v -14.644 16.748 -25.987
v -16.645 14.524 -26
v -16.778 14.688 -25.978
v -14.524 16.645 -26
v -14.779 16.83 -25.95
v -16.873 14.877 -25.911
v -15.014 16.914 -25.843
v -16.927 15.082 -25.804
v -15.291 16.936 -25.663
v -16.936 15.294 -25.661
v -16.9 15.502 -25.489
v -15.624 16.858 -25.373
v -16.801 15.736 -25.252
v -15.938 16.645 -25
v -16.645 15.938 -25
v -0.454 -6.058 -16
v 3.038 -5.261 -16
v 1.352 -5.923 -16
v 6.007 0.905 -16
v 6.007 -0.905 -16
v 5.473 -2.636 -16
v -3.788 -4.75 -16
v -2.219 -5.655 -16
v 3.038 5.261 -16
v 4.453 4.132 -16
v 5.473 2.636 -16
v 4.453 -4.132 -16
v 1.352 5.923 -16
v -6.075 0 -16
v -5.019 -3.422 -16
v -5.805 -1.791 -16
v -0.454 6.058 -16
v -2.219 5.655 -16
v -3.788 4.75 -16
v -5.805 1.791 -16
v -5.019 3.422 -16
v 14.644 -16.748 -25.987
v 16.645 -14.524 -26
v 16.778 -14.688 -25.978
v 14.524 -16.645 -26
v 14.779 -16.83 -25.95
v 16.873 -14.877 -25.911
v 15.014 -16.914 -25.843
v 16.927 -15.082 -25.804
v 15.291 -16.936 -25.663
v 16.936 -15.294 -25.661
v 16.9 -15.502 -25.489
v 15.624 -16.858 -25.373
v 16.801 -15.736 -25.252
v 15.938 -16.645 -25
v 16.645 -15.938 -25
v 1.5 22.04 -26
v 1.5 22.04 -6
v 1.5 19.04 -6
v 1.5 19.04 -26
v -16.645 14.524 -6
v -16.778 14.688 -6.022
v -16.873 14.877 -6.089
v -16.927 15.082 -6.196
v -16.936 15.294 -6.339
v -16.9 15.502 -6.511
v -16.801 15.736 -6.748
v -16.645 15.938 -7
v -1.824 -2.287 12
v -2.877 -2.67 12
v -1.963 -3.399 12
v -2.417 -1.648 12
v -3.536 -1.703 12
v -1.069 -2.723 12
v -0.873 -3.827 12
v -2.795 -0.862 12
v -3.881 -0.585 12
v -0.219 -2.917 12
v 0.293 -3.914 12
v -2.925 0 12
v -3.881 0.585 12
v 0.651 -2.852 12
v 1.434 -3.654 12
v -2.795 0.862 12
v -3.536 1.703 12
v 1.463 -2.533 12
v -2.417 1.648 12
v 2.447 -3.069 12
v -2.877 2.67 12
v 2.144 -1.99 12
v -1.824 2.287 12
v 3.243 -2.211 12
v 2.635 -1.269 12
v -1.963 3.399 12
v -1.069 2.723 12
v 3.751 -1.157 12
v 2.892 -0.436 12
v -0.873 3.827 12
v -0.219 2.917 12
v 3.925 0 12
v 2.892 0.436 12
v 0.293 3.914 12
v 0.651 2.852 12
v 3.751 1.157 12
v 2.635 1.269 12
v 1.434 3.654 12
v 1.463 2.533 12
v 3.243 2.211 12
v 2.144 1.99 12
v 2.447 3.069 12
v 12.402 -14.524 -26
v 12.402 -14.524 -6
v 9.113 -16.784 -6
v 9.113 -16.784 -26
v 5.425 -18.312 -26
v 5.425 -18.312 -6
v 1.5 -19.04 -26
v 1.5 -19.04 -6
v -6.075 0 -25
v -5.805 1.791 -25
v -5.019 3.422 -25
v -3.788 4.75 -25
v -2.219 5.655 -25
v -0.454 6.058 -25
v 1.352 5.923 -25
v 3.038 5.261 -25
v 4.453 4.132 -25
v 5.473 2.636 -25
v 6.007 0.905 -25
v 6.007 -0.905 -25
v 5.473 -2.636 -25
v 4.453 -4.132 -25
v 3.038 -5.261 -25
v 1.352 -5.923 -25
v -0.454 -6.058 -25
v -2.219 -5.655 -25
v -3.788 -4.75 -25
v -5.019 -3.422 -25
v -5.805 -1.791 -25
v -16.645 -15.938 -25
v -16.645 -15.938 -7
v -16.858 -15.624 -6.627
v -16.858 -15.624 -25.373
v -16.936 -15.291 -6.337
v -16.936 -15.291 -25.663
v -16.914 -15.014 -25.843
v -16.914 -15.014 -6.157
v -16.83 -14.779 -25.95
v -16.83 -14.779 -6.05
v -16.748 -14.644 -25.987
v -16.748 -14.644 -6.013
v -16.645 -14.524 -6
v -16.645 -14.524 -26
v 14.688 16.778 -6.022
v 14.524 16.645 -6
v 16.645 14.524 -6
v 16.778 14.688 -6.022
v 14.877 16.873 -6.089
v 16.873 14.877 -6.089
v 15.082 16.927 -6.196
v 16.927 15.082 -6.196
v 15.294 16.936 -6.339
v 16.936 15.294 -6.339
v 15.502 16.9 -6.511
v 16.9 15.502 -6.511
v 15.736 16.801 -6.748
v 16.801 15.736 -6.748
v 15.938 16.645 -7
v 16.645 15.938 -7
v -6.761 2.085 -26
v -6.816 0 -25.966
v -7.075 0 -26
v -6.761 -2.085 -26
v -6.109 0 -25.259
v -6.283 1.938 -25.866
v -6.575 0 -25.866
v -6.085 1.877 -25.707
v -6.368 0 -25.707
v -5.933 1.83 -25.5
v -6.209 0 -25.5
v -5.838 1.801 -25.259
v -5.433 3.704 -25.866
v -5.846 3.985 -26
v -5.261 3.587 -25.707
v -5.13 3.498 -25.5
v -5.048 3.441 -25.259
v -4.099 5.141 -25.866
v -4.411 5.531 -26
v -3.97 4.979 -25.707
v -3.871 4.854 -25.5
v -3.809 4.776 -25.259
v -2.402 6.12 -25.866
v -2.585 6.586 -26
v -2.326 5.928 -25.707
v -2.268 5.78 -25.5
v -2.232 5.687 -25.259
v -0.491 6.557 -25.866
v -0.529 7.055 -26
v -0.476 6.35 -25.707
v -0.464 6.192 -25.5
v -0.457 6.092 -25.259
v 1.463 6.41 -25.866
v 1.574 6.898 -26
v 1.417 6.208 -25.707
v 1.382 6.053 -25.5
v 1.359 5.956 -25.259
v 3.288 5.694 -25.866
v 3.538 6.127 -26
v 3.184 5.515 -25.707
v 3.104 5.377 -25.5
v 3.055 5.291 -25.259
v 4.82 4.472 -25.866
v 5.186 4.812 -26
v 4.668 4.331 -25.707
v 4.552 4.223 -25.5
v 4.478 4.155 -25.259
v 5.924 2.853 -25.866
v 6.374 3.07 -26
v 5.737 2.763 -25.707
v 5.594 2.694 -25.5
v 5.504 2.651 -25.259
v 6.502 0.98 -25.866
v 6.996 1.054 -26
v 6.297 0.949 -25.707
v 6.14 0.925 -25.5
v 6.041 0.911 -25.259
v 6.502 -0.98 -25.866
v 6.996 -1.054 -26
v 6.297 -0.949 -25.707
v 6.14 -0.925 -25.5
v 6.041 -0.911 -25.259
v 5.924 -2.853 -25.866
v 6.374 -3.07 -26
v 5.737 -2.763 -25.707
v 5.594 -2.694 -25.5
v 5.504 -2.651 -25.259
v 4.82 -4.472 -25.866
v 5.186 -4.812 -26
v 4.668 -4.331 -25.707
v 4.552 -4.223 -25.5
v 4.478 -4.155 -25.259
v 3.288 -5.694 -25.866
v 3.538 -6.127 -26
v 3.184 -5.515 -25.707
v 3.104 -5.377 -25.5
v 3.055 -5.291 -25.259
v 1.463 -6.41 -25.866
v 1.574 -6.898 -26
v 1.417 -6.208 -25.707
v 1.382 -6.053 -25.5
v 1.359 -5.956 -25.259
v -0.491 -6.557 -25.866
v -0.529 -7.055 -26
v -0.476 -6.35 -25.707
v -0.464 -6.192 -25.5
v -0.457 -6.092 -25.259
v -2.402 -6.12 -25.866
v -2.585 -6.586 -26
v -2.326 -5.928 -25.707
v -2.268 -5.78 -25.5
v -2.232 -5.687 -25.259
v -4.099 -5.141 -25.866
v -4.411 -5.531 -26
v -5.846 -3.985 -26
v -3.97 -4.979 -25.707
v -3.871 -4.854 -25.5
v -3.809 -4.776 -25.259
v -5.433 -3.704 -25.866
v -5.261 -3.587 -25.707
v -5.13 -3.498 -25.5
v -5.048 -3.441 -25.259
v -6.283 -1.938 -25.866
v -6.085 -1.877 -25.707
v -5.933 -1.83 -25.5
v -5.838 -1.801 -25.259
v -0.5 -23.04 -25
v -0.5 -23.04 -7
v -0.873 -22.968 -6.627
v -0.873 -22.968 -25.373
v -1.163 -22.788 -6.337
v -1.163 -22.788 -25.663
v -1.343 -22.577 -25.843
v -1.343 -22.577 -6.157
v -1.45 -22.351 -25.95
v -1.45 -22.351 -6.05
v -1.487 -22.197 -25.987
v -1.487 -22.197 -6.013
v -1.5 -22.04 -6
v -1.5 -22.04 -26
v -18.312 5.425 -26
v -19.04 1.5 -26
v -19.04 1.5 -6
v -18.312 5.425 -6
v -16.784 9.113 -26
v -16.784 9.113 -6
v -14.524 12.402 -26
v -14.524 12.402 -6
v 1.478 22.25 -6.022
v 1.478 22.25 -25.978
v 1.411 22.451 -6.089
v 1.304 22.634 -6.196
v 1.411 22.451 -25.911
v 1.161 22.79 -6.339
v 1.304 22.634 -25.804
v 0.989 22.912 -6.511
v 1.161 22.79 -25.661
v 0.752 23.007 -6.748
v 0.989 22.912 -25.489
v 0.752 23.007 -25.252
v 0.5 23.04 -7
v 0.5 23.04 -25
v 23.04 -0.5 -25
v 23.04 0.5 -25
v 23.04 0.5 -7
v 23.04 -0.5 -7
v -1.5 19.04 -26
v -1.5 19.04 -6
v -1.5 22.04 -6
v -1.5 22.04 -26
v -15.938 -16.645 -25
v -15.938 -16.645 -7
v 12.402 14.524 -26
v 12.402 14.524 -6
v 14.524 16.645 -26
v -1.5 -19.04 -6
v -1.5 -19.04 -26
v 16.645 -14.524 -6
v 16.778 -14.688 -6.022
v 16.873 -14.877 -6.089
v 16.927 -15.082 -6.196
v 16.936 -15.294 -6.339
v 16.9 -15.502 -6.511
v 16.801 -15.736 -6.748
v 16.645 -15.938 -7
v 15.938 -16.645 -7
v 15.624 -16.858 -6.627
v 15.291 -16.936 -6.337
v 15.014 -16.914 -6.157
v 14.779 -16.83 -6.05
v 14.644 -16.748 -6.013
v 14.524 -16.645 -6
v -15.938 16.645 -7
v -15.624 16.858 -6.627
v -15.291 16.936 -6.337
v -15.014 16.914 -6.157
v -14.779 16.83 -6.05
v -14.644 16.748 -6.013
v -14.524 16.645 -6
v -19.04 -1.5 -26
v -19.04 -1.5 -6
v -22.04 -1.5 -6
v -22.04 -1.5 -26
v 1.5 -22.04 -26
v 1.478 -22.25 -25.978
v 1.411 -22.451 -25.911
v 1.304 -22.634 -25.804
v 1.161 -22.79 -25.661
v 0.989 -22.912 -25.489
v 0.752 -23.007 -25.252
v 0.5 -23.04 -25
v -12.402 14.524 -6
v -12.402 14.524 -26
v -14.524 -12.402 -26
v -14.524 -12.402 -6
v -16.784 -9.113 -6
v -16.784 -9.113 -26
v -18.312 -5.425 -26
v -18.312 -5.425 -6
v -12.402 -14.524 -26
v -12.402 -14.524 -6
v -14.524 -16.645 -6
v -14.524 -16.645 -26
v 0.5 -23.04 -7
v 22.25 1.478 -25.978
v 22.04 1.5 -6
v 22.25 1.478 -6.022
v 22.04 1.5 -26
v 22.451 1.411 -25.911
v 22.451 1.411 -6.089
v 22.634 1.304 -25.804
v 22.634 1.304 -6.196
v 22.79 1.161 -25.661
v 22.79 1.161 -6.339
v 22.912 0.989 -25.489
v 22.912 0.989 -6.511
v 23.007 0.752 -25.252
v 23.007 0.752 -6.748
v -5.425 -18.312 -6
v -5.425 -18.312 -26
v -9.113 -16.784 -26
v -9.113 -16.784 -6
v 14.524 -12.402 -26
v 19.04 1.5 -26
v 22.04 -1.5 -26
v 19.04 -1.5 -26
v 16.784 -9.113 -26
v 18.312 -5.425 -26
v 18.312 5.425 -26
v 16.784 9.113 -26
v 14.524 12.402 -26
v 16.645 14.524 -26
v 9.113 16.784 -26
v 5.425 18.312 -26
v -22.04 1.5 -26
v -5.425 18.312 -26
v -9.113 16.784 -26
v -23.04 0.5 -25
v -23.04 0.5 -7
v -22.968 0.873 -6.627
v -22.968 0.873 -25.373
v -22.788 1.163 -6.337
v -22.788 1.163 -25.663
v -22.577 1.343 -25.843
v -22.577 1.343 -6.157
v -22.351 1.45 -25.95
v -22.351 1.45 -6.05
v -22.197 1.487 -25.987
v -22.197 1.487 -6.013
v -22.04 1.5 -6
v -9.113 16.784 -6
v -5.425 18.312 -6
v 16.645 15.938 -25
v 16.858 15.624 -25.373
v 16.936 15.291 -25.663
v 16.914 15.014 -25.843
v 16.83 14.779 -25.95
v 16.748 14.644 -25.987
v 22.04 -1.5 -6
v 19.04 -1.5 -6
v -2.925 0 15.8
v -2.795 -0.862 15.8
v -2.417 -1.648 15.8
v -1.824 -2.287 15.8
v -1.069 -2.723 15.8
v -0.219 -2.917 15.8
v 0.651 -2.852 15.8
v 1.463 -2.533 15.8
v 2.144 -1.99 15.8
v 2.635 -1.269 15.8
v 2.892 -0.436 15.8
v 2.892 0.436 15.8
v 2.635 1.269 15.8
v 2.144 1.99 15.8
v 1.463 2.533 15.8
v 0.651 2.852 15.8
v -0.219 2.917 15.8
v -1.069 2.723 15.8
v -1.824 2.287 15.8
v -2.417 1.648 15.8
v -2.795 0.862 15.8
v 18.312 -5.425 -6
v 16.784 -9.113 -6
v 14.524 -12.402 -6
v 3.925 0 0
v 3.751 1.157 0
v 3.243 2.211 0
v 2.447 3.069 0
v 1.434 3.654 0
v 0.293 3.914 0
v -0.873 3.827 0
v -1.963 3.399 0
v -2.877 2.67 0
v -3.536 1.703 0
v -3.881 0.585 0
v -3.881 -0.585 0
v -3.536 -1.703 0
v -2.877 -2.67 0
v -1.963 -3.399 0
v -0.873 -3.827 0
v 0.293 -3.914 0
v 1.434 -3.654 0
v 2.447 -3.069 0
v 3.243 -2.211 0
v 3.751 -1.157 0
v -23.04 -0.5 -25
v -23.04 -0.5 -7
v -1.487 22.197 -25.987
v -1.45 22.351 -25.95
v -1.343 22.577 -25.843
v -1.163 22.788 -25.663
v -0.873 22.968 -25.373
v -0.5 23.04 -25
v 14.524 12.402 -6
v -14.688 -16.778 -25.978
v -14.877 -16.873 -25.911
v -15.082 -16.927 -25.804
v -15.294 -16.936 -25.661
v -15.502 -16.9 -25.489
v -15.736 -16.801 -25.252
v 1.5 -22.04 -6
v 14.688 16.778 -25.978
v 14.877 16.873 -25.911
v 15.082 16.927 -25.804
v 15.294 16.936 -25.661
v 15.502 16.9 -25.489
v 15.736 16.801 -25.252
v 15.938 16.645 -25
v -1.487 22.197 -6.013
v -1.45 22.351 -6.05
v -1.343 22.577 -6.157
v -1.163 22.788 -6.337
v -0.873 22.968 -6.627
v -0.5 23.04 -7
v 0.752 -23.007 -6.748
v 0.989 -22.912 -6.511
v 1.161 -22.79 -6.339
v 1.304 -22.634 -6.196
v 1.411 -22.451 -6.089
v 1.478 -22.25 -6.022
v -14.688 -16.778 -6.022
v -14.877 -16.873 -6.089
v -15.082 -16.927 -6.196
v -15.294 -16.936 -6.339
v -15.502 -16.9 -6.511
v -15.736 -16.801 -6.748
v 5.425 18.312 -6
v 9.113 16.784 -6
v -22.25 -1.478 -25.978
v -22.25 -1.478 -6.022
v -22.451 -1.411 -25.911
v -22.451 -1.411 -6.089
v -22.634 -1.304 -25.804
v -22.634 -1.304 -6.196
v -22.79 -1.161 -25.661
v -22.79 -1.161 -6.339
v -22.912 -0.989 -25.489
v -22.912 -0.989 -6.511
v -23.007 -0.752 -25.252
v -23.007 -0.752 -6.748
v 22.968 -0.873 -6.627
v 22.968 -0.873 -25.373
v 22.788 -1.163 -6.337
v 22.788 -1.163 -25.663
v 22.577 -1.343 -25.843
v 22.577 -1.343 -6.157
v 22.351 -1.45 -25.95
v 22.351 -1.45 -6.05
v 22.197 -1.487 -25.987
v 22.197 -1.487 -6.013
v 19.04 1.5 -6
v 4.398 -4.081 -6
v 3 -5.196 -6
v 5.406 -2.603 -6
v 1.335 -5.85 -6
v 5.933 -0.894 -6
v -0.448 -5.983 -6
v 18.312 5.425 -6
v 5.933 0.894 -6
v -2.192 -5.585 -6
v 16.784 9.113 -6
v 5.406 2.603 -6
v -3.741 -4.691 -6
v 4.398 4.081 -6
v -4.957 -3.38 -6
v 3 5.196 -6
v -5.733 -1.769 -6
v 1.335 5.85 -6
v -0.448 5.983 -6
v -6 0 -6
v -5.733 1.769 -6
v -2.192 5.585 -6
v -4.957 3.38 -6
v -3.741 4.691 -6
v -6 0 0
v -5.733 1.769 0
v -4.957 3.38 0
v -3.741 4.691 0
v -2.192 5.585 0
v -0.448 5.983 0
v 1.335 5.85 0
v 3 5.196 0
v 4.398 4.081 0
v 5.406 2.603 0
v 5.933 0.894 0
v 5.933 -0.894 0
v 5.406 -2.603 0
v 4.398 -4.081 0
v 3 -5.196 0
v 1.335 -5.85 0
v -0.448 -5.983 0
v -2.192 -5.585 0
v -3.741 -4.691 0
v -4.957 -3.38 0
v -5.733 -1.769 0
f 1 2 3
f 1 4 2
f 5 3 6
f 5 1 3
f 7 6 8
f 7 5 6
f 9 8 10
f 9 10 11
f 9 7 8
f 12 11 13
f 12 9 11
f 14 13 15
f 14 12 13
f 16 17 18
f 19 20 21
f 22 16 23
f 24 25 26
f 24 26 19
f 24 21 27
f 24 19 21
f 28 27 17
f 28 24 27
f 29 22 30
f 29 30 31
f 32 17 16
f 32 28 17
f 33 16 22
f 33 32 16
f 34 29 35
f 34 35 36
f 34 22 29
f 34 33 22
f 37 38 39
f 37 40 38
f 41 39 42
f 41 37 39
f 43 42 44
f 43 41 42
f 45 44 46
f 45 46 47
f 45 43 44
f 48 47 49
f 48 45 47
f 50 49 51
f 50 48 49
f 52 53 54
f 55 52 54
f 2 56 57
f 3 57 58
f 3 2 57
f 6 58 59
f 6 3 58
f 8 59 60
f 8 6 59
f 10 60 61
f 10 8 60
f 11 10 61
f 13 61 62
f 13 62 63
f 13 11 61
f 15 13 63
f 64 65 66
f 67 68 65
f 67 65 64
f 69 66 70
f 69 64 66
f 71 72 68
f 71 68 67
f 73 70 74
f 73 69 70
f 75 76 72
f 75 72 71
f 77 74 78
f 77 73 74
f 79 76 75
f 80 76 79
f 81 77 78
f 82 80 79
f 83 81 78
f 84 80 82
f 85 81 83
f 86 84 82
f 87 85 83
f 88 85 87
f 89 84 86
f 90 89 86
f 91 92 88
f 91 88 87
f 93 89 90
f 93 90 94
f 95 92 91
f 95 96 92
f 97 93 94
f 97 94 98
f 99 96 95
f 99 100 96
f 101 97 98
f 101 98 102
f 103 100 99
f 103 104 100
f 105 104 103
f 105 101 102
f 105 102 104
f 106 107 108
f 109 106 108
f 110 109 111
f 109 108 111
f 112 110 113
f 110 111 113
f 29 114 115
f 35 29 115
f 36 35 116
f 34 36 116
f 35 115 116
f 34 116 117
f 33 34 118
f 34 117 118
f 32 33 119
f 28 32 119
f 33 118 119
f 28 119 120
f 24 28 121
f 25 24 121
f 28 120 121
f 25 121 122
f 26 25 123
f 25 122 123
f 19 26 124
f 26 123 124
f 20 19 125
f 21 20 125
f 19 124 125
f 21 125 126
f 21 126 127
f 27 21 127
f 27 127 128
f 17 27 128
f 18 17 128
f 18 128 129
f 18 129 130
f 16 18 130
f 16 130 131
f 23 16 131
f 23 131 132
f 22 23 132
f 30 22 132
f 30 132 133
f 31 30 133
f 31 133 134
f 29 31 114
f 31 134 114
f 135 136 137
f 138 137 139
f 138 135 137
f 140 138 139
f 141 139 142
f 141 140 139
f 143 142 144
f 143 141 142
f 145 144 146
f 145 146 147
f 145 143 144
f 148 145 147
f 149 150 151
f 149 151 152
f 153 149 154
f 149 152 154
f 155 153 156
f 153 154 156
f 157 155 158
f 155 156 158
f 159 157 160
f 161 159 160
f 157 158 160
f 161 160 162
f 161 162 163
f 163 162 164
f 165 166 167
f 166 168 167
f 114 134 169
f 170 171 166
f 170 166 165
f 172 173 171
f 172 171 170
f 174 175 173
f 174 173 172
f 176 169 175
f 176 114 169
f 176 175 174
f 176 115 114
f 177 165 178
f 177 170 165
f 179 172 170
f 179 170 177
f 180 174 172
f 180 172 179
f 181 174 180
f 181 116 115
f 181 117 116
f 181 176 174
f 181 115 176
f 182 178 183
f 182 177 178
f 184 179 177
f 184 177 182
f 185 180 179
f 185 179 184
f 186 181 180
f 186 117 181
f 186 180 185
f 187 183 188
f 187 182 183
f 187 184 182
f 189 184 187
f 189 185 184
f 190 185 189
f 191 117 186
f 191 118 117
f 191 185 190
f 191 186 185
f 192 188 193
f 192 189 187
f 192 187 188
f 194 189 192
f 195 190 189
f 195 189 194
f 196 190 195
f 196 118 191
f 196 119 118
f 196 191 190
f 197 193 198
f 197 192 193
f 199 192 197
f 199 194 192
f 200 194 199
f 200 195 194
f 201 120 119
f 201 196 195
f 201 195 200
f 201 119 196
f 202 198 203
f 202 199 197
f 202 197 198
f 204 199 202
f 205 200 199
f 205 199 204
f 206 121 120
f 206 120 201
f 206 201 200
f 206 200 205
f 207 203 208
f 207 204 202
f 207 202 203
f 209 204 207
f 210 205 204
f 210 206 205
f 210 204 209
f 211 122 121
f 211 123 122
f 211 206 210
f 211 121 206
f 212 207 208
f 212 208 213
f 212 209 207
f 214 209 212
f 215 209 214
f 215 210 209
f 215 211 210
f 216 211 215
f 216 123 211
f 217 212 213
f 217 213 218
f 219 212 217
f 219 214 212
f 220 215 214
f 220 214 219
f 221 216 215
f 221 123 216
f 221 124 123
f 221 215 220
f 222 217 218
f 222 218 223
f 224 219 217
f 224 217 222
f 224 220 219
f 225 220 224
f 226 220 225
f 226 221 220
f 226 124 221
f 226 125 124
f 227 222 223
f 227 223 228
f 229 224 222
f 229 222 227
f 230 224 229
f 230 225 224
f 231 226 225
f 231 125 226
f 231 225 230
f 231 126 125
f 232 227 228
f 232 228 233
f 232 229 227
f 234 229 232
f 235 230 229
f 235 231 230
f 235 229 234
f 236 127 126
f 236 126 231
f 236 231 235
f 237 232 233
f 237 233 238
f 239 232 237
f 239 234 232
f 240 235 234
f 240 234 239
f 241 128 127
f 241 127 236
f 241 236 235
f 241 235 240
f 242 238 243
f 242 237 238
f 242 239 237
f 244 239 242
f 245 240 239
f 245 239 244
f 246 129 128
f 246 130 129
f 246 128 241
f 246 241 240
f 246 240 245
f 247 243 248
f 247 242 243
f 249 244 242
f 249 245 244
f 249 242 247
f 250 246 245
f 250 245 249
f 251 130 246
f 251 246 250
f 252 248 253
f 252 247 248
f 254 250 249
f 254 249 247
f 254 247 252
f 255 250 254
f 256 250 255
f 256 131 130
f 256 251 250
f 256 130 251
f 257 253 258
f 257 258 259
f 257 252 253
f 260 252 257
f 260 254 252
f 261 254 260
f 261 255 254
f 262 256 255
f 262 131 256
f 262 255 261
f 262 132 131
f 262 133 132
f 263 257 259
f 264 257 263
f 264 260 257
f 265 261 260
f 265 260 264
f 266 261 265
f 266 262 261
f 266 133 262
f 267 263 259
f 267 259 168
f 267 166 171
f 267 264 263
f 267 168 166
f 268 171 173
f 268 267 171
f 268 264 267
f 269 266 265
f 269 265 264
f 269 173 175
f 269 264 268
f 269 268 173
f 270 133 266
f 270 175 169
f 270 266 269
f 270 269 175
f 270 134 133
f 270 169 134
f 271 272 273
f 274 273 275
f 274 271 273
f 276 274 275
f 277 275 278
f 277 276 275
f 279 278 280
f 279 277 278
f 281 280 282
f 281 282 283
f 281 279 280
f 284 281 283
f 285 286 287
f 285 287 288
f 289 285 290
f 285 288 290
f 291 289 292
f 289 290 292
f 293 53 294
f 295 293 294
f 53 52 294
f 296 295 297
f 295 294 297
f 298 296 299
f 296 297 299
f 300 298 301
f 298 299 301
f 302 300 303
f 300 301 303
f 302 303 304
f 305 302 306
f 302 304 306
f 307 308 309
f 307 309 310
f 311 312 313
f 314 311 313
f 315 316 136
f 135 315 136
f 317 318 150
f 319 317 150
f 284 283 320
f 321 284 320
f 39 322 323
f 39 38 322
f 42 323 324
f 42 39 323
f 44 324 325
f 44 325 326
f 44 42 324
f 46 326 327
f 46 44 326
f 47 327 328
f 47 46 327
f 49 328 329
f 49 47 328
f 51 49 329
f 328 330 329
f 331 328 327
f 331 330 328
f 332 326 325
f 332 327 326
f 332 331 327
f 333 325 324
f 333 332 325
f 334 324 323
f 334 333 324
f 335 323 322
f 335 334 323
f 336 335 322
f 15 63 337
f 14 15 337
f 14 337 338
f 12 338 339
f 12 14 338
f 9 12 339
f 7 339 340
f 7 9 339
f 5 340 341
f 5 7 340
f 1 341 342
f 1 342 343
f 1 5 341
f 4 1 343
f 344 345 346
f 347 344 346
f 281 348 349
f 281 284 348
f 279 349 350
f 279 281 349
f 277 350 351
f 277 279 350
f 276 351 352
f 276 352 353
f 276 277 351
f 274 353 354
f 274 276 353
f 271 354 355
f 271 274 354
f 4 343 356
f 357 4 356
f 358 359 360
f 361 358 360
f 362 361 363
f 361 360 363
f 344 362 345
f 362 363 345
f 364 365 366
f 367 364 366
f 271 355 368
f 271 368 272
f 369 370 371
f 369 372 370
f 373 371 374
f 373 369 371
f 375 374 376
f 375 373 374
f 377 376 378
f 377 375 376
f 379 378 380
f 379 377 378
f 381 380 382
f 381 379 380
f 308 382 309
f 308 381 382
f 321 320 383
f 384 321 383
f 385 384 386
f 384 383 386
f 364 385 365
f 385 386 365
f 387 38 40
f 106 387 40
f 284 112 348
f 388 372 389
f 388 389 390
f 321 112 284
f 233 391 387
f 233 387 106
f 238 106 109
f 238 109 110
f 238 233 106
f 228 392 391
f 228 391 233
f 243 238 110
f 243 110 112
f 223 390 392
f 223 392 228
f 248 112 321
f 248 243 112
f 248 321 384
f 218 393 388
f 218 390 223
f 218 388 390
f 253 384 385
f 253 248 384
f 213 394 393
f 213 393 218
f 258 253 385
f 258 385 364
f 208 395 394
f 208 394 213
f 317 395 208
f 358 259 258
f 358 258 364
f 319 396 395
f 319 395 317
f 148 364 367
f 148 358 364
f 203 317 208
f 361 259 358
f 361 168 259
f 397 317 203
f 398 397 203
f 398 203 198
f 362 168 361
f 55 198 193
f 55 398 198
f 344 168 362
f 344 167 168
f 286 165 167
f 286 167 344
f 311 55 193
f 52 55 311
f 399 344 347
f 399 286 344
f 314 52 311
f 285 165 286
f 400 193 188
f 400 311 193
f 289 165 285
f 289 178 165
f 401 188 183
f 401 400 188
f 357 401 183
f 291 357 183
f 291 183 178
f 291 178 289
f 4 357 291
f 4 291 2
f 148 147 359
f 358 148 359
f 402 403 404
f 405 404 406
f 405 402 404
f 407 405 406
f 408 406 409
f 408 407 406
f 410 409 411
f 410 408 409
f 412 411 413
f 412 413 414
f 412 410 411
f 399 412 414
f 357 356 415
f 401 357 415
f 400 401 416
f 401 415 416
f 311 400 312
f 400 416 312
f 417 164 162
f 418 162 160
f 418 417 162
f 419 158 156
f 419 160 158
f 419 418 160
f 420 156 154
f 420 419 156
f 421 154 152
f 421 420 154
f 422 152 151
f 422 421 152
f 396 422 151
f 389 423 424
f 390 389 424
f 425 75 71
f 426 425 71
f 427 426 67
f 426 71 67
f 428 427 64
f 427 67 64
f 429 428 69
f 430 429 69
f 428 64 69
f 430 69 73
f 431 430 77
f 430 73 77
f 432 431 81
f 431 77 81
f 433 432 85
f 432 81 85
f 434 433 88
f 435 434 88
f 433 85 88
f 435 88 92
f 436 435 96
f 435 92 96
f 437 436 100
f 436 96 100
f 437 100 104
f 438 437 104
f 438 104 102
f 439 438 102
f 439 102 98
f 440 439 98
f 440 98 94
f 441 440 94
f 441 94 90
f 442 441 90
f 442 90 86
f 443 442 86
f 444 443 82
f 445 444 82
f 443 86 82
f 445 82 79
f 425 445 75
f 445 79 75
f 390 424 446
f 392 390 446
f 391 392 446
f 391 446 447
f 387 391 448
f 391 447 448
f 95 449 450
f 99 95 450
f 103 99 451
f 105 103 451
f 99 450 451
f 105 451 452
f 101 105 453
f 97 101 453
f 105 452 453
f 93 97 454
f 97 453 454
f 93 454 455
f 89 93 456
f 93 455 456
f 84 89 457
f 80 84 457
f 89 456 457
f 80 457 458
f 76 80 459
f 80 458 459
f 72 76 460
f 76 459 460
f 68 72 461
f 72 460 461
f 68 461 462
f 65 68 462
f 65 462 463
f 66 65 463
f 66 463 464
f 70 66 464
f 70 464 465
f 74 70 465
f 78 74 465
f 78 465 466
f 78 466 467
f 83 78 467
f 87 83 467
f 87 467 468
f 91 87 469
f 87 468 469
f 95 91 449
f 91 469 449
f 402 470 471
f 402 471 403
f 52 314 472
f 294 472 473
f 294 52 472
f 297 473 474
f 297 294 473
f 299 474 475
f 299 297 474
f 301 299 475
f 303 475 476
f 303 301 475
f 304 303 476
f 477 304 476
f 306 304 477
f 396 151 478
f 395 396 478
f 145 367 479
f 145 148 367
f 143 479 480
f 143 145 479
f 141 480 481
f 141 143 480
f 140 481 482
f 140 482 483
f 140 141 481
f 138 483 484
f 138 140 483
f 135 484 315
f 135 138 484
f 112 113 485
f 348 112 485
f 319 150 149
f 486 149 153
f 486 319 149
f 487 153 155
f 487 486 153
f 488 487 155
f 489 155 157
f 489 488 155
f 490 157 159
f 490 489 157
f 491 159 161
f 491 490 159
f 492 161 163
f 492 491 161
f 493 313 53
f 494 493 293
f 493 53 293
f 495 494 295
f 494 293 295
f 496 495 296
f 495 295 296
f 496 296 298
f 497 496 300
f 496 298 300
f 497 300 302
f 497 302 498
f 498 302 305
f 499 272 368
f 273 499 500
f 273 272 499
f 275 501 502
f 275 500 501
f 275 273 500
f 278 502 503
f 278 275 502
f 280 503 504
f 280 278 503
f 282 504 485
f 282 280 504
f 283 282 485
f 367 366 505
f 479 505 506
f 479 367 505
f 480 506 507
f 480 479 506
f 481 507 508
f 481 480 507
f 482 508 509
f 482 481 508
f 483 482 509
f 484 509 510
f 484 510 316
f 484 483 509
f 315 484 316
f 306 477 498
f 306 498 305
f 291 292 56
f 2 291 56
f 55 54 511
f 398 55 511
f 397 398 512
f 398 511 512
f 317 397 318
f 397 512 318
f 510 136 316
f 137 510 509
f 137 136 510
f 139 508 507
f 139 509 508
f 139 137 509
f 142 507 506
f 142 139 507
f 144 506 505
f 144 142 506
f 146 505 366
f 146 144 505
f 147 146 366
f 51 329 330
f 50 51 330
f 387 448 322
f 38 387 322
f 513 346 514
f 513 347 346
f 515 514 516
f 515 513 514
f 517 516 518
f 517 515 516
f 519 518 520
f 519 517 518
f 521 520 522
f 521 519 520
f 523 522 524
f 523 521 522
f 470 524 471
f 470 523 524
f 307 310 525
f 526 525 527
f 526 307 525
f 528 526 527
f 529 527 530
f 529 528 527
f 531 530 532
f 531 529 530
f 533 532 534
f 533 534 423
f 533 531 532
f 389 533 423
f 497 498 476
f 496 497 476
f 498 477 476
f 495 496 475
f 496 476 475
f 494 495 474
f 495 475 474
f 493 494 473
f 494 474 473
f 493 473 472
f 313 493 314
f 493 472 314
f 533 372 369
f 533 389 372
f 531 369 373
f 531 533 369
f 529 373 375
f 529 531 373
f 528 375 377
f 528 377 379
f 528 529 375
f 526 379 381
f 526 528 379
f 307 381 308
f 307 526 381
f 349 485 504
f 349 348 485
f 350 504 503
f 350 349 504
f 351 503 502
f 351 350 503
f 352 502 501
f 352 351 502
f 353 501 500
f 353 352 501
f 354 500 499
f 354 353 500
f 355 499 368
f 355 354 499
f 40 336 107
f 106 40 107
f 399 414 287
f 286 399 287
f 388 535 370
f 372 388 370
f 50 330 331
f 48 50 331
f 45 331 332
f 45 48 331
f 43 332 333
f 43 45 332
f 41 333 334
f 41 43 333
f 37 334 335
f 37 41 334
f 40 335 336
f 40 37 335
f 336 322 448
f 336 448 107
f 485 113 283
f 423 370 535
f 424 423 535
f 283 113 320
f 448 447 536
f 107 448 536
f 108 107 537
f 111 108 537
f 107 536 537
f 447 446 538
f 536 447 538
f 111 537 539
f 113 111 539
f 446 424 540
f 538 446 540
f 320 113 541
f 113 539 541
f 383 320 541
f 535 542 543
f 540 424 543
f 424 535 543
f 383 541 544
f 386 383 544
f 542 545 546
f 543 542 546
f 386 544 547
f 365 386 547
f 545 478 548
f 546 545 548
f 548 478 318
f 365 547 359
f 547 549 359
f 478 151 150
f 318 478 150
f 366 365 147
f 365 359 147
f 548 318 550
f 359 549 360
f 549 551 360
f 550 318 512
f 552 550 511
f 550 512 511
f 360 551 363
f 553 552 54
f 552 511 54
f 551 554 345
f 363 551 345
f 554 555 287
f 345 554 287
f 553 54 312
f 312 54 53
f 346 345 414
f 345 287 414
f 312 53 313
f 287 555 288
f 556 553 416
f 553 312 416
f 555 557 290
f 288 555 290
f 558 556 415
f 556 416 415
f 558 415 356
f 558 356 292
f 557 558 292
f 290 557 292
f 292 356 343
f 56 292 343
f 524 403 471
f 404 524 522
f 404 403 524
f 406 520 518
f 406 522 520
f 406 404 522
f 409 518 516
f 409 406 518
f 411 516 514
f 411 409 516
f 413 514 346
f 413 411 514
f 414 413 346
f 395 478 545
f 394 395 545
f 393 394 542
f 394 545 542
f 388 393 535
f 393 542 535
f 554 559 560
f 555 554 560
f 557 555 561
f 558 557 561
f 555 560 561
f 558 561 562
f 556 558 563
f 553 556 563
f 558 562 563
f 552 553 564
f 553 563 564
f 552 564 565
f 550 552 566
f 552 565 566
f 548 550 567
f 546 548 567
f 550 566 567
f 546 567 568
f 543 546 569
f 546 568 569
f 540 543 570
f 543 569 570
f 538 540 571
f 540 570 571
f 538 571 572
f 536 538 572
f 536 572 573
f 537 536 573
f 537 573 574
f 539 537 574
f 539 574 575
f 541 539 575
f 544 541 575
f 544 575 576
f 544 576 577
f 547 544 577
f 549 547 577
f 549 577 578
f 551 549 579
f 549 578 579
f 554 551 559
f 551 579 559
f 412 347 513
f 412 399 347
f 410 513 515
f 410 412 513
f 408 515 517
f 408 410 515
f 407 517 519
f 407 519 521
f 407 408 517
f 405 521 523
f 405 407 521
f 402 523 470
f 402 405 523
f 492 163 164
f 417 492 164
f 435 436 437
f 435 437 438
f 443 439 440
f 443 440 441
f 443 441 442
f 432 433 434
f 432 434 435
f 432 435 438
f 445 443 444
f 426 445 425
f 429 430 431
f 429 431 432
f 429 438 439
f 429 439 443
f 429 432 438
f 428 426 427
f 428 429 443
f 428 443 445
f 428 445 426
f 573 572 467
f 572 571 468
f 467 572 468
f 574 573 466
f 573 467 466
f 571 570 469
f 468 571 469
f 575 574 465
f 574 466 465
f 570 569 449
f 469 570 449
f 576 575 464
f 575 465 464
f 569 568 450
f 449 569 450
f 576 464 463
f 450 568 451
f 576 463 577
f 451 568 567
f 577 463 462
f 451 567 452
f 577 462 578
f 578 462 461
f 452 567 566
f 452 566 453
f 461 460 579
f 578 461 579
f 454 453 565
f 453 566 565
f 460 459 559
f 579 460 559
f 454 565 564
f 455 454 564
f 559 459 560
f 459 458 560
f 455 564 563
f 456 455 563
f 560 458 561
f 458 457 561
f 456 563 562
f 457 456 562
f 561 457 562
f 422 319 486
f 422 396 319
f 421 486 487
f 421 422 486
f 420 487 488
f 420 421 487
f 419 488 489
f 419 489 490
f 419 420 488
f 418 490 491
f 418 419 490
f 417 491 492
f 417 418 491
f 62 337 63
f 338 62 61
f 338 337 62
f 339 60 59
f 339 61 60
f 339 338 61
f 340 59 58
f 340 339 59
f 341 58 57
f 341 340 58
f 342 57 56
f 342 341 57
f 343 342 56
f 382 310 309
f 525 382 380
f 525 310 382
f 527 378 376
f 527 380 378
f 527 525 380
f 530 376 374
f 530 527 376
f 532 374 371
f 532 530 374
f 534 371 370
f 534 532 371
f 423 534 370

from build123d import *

# Parameters (mm, degrees)
SKIZZE1_R                       = 3.925
AUFSATZ_LINEAR_AUSTRAGEN1_DEPTH = 12
SKIZZE2_R                       = 6
AUFSATZ_LINEAR_AUSTRAGEN2_DEPTH = 6
SKIZZE3_R                       = 19.098593171
AUFSATZ_LINEAR_AUSTRAGEN3_DEPTH = 20
SKIZZE4_R                       = 6.075
SCHNITT_LINEAR_AUSTRAGEN1_DEPTH = 10
VERRUNDUNG1_R                   = 1
AUFSATZ_LINEAR_START            = -20
AUFSATZ_LINEAR_AUSTRAGEN4_DEPTH = 20
VERRUNDUNG2_R                   = 1
KREISMUSTER1_COUNT              = 8
VERRUNDUNG2_OF_KREISMUSTER1_R   = 1
SKIZZE6_R                       = 2.925
AUFSATZ_LINEAR_AUSTRAGEN5_DEPTH = 3.8


with BuildPart() as part:
    # Skizze1 → Aufsatz-Linear austragen1 (new body)
    with BuildSketch(Plane.XY):
        Circle(SKIZZE1_R)
    extrude(amount=AUFSATZ_LINEAR_AUSTRAGEN1_DEPTH)

    # Skizze2 → Aufsatz-Linear austragen2 (add)
    with BuildSketch(Plane(origin=(0, 0, 0), x_dir=(-1, 0, 0), z_dir=(0, 0, -1))):
        Circle(SKIZZE2_R)
    extrude(amount=AUFSATZ_LINEAR_AUSTRAGEN2_DEPTH)

    # Skizze3 → Aufsatz-Linear austragen3 (add)
    with BuildSketch(Plane(origin=(0, 0, -6), x_dir=(-1, 0, 0), z_dir=(0, 0, -1))):
        Circle(SKIZZE3_R)
    extrude(amount=AUFSATZ_LINEAR_AUSTRAGEN3_DEPTH)

    # Skizze4 → Schnitt-Linear austragen1 (cut)
    with BuildSketch(Plane(origin=(0, 0, -26), x_dir=(-1, 0, 0), z_dir=(0, 0, -1))):
        Circle(SKIZZE4_R)
    extrude(amount=-SCHNITT_LINEAR_AUSTRAGEN1_DEPTH, mode=Mode.SUBTRACT)

    # Verrundung1
    verrundung1_edges = [part.edges().sort_by_distance(p)[0] for p in [
        (6.075, 0, -26),
    ]]
    fillet(verrundung1_edges, radius=VERRUNDUNG1_R)

    # Skizze5 → Aufsatz-Linear austragen4 (add)
    with BuildSketch(Plane(origin=(0, 0, -26), x_dir=(-1, 0, 0), z_dir=(0, 0, -1)).offset(AUFSATZ_LINEAR_START)):
        with BuildLine():
            Line((0, 23.039597189), (0, 19.098593171))
            ThreePointArc((0, 19.098593171), (0.750579863, 19.083838476), (1.5, 19.039597189))
            Line((1.5, 19.039597189), (1.5, 23.039597189))
            Line((1.5, 23.039597189), (0, 23.039597189))
        make_face()
        with BuildLine():
            ThreePointArc((-1.5, 19.039597189), (-0.750579863, 19.083838476), (0, 19.098593171))
            Line((0, 19.098593171), (0, 23.039597189))
            Line((0, 23.039597189), (-1.5, 23.039597189))
            Line((-1.5, 23.039597189), (-1.5, 19.039597189))
        make_face()
    aufsatz_linear_austragen4 = extrude(amount=AUFSATZ_LINEAR_AUSTRAGEN4_DEPTH)

    # Verrundung2
    verrundung2_edges = [part.edges().sort_by_distance(p)[0] for p in [
        (-1.5, 23.039597189, -16),
        (0, 23.039597189, -6),
        (1.5, 23.039597189, -16),
        (0, 23.039597189, -26),
    ]]
    fillet(verrundung2_edges, radius=VERRUNDUNG2_R)

    # Kreismuster1: Aufsatz-Linear austragen4 ×8 about axis
    kreismuster1_axis = Axis((0, 0, 0), (0, 0, 1))
    for i in range(1, KREISMUSTER1_COUNT):
        add(aufsatz_linear_austragen4.rotate(kreismuster1_axis, i * 360 / KREISMUSTER1_COUNT))

    # Verrundung2 of Kreismuster1
    verrundung2_of_kreismuster1_edges = [part.edges().sort_by_distance(p)[0] for p in [
        (-17.35211558, 15.230795236, -16),
        (-16.291455408, 16.291455408, -6),
        (-15.230795236, 17.35211558, -16),
        (-16.291455408, 16.291455408, -26),
        (-23.039597189, -1.5, -16),
        (-23.039597189, 0, -6),
        (-23.039597189, 1.5, -16),
        (-23.039597189, 0, -26),
        (-15.230795236, -17.35211558, -16),
        (-16.291455408, -16.291455408, -6),
        (-17.35211558, -15.230795236, -16),
        (-16.291455408, -16.291455408, -26),
        (1.5, -23.039597189, -16),
        (0, -23.039597189, -6),
        (-1.5, -23.039597189, -16),
        (0, -23.039597189, -26),
        (17.35211558, -15.230795236, -16),
        (16.291455408, -16.291455408, -6),
        (15.230795236, -17.35211558, -16),
        (16.291455408, -16.291455408, -26),
        (23.039597189, 1.5, -16),
        (23.039597189, 0, -6),
        (23.039597189, -1.5, -16),
        (23.039597189, 0, -26),
        (15.230795236, 17.35211558, -16),
        (16.291455408, 16.291455408, -6),
        (17.35211558, 15.230795236, -16),
        (16.291455408, 16.291455408, -26),
    ]]
    fillet(verrundung2_of_kreismuster1_edges, radius=VERRUNDUNG2_OF_KREISMUSTER1_R)

    # Skizze6 → Aufsatz-Linear austragen5 (add)
    with BuildSketch(Plane.XY.offset(12)):
        with Locations(Location((0, 0, 0), (0, 0, 180))):
            Circle(SKIZZE6_R)
    extrude(amount=AUFSATZ_LINEAR_AUSTRAGEN5_DEPTH)


solid = part.part
